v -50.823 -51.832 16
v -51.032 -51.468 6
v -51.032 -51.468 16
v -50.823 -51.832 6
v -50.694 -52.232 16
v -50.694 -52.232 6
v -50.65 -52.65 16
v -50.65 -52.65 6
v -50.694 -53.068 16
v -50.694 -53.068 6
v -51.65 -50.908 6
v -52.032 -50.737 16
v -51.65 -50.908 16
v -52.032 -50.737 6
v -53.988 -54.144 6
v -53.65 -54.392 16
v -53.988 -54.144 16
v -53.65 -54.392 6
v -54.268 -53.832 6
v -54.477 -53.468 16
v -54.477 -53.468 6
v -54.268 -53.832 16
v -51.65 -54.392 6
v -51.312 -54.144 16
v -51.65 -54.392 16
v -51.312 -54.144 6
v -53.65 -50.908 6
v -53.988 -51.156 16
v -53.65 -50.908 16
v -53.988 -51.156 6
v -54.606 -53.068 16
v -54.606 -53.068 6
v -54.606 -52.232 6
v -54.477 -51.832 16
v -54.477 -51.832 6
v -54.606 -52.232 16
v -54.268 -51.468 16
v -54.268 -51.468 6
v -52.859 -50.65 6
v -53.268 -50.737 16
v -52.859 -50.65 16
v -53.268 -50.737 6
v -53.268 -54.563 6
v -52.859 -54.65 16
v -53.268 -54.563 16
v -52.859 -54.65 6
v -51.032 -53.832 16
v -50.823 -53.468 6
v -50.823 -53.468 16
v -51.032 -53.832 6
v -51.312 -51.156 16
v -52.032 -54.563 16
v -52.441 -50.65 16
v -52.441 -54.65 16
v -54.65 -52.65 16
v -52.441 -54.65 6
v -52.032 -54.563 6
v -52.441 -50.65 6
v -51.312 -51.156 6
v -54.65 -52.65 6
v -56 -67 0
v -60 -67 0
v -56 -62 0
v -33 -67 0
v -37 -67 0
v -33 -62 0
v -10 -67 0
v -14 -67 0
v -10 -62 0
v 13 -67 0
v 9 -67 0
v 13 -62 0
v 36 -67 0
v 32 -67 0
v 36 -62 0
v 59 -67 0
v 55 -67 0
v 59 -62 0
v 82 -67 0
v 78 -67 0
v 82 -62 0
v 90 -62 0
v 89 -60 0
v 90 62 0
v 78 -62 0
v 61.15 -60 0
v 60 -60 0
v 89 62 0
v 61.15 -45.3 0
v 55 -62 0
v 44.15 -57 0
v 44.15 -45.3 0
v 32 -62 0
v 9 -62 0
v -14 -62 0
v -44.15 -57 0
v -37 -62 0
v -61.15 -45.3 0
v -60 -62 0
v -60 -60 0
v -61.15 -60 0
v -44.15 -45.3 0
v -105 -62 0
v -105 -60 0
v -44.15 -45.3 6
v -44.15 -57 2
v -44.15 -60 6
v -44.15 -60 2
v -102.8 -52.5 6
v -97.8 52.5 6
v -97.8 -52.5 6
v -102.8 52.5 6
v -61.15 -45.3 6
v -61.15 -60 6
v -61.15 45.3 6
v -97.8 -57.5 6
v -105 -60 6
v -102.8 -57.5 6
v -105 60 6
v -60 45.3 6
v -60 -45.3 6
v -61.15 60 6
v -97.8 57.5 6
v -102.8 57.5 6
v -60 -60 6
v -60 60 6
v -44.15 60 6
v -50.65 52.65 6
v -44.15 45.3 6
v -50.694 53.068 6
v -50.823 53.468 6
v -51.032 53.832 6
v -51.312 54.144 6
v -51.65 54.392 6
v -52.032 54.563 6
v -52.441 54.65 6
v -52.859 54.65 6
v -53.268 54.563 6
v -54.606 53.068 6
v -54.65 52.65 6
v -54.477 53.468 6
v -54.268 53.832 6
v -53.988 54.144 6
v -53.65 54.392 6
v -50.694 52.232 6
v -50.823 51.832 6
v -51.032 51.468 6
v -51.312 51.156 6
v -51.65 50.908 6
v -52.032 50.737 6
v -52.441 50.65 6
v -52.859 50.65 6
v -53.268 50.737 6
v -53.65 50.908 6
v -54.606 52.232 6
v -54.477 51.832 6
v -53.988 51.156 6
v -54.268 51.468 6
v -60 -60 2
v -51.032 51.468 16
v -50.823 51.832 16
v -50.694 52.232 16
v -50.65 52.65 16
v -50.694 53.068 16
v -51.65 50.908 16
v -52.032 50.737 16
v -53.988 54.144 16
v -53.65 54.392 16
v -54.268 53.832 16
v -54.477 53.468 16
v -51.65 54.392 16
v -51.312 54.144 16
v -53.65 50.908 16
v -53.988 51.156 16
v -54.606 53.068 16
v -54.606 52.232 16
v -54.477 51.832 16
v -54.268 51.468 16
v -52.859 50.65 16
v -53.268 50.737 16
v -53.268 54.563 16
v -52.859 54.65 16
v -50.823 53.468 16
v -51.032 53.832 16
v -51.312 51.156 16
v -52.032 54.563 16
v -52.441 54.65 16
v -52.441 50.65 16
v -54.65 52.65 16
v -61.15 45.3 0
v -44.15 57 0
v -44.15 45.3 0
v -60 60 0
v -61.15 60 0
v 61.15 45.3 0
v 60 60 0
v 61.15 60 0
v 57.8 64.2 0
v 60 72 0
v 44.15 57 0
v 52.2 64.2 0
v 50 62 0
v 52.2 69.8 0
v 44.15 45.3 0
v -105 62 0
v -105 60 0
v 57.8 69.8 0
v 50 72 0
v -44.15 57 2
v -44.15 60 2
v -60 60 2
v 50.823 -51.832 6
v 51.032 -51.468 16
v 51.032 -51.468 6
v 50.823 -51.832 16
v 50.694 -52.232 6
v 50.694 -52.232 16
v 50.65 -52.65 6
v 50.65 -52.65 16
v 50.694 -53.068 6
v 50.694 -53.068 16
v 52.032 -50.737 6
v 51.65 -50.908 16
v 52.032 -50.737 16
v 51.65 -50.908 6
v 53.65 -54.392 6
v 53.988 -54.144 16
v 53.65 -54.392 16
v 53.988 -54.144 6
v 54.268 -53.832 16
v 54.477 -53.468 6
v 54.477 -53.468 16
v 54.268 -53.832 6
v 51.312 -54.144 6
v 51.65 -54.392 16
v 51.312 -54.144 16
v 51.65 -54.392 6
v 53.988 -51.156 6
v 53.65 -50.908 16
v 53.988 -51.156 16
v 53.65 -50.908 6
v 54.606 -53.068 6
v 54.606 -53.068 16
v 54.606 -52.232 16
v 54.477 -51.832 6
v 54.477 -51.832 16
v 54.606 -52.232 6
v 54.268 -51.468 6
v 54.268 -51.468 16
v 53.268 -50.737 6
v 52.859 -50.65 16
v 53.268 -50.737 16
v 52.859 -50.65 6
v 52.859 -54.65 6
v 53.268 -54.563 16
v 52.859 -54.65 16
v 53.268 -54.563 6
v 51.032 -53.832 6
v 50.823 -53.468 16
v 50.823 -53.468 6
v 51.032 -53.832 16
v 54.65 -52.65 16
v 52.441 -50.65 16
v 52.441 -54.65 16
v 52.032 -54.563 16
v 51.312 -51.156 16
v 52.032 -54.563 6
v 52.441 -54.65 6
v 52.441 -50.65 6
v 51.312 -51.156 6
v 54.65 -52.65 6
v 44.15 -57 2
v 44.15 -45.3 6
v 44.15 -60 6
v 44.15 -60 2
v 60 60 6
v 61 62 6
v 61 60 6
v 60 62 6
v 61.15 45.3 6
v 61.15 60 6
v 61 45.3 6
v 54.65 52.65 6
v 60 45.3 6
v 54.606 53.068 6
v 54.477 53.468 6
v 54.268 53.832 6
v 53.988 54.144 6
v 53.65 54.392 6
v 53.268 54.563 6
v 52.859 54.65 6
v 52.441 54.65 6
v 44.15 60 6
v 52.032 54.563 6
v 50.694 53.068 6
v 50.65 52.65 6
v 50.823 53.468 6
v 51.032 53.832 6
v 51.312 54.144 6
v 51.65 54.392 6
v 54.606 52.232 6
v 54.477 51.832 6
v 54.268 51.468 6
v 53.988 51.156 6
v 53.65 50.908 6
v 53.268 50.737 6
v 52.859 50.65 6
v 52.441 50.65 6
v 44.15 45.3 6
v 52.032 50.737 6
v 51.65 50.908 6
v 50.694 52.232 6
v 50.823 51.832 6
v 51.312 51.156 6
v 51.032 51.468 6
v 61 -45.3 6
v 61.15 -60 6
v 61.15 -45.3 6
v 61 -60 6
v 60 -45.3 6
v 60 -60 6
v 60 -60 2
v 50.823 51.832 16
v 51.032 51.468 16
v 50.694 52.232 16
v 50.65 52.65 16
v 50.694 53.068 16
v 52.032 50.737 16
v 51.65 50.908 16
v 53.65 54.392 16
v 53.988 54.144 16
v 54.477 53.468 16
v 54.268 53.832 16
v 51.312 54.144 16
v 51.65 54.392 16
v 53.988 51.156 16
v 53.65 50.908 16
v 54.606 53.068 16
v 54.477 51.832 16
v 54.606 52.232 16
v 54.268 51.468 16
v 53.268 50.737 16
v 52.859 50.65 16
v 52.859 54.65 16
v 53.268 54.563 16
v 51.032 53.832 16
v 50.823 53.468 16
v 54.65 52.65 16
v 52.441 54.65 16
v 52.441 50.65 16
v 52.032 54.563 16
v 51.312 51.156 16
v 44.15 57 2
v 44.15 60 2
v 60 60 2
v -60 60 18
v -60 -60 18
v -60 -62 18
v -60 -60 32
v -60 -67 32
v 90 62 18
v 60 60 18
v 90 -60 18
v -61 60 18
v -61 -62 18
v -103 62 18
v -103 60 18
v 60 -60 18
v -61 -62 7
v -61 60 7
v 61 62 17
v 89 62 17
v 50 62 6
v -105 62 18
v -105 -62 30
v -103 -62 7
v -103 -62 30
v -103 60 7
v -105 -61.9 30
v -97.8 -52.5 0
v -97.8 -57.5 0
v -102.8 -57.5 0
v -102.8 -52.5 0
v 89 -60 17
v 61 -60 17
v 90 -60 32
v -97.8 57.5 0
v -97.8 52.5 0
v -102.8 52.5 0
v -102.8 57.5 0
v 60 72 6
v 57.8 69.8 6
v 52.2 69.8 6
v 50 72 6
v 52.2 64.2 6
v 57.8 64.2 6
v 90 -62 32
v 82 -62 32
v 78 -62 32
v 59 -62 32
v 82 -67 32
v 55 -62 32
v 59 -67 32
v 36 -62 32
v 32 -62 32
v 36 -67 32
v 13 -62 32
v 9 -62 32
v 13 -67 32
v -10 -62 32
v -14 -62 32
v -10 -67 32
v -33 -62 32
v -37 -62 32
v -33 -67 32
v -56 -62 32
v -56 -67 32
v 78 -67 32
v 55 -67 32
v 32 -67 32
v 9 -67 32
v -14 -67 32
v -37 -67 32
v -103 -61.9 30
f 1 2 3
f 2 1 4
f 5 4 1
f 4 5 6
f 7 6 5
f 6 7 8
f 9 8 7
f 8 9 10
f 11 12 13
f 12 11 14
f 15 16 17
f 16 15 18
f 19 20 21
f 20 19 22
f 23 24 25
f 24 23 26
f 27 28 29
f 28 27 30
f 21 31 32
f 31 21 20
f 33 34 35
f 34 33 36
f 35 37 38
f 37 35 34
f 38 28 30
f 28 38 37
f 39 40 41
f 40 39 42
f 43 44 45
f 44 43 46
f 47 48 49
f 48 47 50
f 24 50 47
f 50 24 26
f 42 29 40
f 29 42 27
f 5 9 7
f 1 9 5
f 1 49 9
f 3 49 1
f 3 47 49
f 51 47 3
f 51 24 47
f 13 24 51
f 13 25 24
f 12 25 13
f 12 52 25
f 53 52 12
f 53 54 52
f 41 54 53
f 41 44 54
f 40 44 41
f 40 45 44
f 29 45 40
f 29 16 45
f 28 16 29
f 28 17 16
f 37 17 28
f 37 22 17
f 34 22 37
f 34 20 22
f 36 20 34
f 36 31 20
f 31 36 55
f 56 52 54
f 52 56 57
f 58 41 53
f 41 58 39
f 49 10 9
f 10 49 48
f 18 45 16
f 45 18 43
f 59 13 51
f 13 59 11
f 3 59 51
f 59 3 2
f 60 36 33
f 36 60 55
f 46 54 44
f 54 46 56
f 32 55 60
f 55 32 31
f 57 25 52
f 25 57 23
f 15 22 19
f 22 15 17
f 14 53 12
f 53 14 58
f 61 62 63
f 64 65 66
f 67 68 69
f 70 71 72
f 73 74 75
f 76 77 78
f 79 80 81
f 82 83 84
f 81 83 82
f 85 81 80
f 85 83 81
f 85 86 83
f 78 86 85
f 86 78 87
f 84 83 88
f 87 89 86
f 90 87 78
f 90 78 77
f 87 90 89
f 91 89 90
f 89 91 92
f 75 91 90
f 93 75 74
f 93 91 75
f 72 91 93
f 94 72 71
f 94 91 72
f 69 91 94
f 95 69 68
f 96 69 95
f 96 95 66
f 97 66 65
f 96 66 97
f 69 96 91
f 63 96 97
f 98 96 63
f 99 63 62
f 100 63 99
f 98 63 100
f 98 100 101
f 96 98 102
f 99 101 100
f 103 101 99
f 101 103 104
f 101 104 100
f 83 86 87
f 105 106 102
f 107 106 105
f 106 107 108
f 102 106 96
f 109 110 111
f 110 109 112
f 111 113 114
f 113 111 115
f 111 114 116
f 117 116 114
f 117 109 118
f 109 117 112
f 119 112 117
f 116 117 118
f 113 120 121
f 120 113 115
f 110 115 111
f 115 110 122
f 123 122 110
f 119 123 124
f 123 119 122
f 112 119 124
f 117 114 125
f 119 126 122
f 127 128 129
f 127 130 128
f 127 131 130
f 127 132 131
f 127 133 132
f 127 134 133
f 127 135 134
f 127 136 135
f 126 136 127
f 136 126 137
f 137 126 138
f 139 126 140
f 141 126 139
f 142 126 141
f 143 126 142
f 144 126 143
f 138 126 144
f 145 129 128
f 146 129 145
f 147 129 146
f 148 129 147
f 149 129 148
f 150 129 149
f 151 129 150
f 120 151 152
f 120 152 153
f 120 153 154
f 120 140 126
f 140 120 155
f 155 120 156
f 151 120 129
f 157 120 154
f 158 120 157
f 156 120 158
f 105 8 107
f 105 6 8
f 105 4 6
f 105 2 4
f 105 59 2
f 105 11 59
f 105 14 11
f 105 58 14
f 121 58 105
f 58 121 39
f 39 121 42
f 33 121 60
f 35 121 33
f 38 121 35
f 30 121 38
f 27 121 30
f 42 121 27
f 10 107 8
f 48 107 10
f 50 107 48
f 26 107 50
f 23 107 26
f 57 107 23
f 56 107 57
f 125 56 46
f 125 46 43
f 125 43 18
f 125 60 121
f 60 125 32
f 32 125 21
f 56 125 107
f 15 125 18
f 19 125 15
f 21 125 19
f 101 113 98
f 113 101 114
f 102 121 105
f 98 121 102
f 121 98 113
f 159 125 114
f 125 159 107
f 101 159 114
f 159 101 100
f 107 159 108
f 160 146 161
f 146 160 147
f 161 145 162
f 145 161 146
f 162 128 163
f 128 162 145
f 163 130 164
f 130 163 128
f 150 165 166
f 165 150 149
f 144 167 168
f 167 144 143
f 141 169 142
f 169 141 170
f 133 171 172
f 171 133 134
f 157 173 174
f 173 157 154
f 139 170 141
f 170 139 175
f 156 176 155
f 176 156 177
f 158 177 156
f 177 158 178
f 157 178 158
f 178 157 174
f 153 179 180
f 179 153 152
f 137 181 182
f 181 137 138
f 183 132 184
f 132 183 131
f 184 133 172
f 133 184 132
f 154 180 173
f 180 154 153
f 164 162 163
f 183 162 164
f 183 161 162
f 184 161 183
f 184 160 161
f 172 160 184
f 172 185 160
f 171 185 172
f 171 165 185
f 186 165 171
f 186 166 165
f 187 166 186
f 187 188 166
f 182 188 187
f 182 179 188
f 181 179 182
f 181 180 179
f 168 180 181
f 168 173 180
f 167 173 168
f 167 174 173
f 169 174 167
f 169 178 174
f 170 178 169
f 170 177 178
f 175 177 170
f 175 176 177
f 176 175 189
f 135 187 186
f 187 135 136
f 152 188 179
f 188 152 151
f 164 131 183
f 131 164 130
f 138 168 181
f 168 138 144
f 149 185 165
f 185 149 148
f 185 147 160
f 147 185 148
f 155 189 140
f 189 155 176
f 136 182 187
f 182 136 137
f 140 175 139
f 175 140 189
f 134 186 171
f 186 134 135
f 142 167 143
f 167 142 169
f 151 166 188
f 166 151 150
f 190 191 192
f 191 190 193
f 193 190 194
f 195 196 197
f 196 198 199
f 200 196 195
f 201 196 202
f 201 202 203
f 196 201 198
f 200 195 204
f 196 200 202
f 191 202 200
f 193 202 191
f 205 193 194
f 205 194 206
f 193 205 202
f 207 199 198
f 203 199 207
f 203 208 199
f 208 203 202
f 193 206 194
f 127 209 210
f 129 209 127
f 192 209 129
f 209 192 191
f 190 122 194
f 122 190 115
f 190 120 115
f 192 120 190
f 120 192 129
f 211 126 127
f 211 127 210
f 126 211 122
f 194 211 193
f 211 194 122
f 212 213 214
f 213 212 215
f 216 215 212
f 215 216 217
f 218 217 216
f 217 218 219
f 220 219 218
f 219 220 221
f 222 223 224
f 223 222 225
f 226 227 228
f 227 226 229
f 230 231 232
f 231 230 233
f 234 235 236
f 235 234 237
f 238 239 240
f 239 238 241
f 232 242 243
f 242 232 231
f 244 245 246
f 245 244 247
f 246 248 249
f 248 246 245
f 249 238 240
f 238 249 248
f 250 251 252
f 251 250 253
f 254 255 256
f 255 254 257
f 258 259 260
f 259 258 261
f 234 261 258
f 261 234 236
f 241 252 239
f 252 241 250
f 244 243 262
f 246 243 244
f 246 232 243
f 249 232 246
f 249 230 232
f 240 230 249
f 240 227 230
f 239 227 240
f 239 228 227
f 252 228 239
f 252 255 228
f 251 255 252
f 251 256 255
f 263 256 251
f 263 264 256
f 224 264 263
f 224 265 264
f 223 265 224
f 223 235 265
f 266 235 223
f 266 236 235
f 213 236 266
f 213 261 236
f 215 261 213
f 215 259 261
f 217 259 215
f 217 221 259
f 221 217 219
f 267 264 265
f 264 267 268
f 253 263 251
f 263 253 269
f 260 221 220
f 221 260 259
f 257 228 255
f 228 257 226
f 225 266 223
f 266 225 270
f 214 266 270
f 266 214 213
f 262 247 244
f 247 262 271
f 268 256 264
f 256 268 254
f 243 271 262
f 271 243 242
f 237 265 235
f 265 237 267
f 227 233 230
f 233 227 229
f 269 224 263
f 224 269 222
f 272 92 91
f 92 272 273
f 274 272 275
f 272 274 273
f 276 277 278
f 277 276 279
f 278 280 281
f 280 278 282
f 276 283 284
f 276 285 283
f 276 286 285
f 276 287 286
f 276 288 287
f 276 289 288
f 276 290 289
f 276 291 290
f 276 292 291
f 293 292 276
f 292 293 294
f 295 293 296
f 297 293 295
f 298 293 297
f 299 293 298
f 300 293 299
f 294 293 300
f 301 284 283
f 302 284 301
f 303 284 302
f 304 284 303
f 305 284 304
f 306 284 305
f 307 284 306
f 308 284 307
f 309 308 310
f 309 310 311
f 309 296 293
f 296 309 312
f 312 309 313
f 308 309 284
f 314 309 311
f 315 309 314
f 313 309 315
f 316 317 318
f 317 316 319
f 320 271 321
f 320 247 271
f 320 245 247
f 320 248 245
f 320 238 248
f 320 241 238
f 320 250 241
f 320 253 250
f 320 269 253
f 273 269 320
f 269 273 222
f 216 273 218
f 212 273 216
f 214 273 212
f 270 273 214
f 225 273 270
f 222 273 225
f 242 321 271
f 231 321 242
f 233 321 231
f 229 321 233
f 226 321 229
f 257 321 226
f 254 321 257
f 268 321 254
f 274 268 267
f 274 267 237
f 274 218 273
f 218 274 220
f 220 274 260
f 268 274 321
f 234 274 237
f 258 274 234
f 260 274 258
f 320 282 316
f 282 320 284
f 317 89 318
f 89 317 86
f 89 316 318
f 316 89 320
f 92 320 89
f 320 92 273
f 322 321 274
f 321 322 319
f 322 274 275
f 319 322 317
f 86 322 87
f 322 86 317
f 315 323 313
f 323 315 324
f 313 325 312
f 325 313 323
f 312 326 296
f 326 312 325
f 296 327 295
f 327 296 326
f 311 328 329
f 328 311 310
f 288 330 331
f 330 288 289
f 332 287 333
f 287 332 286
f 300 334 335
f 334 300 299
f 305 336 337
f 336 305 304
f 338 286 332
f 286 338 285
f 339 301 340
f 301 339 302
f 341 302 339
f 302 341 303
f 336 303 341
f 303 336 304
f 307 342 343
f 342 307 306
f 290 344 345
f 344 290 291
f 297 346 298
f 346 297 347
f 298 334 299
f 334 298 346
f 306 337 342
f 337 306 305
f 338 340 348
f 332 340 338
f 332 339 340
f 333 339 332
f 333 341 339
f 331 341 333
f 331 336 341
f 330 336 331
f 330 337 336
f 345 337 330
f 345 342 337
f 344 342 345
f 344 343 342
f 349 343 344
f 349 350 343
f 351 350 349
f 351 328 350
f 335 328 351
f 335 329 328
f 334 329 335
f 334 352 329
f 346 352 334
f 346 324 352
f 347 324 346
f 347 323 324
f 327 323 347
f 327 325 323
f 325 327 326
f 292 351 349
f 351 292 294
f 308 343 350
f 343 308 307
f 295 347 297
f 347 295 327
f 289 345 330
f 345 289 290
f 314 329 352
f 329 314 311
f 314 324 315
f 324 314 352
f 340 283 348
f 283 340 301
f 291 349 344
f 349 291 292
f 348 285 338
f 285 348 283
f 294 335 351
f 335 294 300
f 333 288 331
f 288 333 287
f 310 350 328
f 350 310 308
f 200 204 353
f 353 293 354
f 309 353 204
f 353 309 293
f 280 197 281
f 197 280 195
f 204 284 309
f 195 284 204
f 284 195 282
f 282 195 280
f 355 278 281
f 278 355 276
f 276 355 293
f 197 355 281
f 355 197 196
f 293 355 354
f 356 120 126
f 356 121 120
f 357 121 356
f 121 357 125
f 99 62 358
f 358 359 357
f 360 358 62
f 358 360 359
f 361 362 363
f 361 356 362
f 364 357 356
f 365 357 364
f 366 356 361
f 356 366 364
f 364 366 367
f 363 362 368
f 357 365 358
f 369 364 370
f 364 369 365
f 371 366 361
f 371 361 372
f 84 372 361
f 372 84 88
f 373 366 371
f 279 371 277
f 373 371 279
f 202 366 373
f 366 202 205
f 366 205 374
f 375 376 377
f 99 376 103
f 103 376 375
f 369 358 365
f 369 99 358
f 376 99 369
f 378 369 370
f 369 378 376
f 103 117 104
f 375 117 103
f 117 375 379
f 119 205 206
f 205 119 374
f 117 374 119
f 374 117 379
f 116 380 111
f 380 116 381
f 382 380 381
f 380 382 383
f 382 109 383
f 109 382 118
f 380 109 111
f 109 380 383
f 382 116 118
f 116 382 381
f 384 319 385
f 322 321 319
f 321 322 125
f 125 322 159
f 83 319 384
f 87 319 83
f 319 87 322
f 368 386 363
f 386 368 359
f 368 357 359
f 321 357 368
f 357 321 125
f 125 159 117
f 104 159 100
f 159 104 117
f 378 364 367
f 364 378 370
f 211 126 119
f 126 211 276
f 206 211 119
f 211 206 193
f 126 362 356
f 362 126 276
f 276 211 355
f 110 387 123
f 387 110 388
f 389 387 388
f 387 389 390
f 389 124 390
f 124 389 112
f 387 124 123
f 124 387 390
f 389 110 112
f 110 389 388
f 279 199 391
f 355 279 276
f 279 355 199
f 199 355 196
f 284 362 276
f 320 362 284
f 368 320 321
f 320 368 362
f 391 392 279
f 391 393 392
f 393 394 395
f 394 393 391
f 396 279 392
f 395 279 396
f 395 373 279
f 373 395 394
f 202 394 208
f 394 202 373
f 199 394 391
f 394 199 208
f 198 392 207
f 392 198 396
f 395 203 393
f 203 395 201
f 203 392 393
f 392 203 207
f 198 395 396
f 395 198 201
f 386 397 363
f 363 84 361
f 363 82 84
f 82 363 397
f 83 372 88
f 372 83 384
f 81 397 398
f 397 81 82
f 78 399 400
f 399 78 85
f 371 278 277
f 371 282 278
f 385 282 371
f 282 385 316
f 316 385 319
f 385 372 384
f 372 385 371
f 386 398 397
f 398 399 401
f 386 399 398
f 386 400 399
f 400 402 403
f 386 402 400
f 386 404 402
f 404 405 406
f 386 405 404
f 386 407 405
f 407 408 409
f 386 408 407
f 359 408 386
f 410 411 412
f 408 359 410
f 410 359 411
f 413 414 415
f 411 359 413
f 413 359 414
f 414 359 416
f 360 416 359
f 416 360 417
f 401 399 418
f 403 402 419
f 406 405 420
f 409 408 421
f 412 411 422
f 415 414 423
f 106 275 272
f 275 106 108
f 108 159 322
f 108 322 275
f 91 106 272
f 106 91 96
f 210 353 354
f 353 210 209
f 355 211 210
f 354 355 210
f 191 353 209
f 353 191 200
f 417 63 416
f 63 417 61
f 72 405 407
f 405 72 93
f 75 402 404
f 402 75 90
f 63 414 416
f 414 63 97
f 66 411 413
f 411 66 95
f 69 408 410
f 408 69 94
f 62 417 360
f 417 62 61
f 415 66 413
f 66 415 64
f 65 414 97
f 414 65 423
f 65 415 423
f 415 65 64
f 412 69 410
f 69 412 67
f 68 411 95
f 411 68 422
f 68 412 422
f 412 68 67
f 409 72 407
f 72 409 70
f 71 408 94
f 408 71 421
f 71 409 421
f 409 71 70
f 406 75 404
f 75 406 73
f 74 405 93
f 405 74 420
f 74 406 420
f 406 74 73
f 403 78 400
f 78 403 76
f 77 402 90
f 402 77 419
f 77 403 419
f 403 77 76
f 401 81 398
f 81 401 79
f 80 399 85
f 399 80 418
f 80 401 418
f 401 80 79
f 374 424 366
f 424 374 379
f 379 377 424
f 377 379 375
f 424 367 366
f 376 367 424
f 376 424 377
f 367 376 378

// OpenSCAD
include <../../lib/relativity.scad/relativity.scad>

floor_thickness = 1;
wall_thickness = 2;

thickness = 1.5;

fan_size = 120;
$fn = 30;
w1 = 45;
w2 = 30;
depth = fan_size + wall_thickness * 2;

intersection() {
  // box([200, 200, 100], anchor=-x);
  // box([200, 200, 100], anchor=x);

  hulled("hulled")
  box([fan_size, fan_size, 0]) {
    mirrored(x) mirrored(y) 
      align(-x-y) translated(14.7/2*x+14.7/2*y) rod(d=4, h=16, anchor=-z) align(-z) box([17, 14.7, 6], anchor=-z);
    align(-x-y-z) color("green") box([w1, wall_thickness, 6], anchor=x+y-z) {
      align(x-y+z) box([floor_thickness, depth, 12], anchor=x-y-z);
      align(-y+z) box([w1, depth, floor_thickness], anchor=-y-z);
      align(-x+y-z) translated(4.7*x+5*y) box([5, 5, 6], anchor=-z);
      align(-x-y+z) box([wall_thickness, 0.1, 24], anchor=-x-y-z, $class="hulled");
    }
    align(-x+y-z) color("blue") box([w1, wall_thickness, 18], anchor=x-y-z) {
      align(-x-y-z) translated(4.7*x-5*y) box([5, 5, 6], anchor=-z);
      align(-x+y+z) box([wall_thickness, 0.1, 12], anchor=-x+y+z, $class="hulled");
    }
    align(y-z) color("orange") box([fan_size, wall_thickness, 18], anchor=-y-z)
        align(x+y-z) differed("hole") box([10, 10, 6], anchor=x-y-z) box([5.6, 5.6, 7], $class="hole");
    align(x-y-z) color("lightgreen") box([w2, wall_thickness, 18], anchor=-x+y-z) {
      align(-y+z) box([$parent_size.x, depth, floor_thickness], anchor=-y+z) {
        align(x+y+z) box([floor_thickness, depth, 18], anchor=x+y+z);
        align(-x+y+z) box([floor_thickness, depth, 12], anchor=-x+y+z);
      }
      align(x-y-z) box([$parent_size.x, wall_thickness, 32], anchor=x-y-z);
    }
    mirrored(y) align(y-z) box([fan_size, 3, 2], anchor=y-z);
    align(-y-z) color("red") box([fan_size, wall_thickness, 32], anchor=y-z)
      translated(11*x) translated(23*x, n=[-3:3]) align(-y-z) box([4, 5, $parent_size.z], anchor=+y-z);
  }
}
